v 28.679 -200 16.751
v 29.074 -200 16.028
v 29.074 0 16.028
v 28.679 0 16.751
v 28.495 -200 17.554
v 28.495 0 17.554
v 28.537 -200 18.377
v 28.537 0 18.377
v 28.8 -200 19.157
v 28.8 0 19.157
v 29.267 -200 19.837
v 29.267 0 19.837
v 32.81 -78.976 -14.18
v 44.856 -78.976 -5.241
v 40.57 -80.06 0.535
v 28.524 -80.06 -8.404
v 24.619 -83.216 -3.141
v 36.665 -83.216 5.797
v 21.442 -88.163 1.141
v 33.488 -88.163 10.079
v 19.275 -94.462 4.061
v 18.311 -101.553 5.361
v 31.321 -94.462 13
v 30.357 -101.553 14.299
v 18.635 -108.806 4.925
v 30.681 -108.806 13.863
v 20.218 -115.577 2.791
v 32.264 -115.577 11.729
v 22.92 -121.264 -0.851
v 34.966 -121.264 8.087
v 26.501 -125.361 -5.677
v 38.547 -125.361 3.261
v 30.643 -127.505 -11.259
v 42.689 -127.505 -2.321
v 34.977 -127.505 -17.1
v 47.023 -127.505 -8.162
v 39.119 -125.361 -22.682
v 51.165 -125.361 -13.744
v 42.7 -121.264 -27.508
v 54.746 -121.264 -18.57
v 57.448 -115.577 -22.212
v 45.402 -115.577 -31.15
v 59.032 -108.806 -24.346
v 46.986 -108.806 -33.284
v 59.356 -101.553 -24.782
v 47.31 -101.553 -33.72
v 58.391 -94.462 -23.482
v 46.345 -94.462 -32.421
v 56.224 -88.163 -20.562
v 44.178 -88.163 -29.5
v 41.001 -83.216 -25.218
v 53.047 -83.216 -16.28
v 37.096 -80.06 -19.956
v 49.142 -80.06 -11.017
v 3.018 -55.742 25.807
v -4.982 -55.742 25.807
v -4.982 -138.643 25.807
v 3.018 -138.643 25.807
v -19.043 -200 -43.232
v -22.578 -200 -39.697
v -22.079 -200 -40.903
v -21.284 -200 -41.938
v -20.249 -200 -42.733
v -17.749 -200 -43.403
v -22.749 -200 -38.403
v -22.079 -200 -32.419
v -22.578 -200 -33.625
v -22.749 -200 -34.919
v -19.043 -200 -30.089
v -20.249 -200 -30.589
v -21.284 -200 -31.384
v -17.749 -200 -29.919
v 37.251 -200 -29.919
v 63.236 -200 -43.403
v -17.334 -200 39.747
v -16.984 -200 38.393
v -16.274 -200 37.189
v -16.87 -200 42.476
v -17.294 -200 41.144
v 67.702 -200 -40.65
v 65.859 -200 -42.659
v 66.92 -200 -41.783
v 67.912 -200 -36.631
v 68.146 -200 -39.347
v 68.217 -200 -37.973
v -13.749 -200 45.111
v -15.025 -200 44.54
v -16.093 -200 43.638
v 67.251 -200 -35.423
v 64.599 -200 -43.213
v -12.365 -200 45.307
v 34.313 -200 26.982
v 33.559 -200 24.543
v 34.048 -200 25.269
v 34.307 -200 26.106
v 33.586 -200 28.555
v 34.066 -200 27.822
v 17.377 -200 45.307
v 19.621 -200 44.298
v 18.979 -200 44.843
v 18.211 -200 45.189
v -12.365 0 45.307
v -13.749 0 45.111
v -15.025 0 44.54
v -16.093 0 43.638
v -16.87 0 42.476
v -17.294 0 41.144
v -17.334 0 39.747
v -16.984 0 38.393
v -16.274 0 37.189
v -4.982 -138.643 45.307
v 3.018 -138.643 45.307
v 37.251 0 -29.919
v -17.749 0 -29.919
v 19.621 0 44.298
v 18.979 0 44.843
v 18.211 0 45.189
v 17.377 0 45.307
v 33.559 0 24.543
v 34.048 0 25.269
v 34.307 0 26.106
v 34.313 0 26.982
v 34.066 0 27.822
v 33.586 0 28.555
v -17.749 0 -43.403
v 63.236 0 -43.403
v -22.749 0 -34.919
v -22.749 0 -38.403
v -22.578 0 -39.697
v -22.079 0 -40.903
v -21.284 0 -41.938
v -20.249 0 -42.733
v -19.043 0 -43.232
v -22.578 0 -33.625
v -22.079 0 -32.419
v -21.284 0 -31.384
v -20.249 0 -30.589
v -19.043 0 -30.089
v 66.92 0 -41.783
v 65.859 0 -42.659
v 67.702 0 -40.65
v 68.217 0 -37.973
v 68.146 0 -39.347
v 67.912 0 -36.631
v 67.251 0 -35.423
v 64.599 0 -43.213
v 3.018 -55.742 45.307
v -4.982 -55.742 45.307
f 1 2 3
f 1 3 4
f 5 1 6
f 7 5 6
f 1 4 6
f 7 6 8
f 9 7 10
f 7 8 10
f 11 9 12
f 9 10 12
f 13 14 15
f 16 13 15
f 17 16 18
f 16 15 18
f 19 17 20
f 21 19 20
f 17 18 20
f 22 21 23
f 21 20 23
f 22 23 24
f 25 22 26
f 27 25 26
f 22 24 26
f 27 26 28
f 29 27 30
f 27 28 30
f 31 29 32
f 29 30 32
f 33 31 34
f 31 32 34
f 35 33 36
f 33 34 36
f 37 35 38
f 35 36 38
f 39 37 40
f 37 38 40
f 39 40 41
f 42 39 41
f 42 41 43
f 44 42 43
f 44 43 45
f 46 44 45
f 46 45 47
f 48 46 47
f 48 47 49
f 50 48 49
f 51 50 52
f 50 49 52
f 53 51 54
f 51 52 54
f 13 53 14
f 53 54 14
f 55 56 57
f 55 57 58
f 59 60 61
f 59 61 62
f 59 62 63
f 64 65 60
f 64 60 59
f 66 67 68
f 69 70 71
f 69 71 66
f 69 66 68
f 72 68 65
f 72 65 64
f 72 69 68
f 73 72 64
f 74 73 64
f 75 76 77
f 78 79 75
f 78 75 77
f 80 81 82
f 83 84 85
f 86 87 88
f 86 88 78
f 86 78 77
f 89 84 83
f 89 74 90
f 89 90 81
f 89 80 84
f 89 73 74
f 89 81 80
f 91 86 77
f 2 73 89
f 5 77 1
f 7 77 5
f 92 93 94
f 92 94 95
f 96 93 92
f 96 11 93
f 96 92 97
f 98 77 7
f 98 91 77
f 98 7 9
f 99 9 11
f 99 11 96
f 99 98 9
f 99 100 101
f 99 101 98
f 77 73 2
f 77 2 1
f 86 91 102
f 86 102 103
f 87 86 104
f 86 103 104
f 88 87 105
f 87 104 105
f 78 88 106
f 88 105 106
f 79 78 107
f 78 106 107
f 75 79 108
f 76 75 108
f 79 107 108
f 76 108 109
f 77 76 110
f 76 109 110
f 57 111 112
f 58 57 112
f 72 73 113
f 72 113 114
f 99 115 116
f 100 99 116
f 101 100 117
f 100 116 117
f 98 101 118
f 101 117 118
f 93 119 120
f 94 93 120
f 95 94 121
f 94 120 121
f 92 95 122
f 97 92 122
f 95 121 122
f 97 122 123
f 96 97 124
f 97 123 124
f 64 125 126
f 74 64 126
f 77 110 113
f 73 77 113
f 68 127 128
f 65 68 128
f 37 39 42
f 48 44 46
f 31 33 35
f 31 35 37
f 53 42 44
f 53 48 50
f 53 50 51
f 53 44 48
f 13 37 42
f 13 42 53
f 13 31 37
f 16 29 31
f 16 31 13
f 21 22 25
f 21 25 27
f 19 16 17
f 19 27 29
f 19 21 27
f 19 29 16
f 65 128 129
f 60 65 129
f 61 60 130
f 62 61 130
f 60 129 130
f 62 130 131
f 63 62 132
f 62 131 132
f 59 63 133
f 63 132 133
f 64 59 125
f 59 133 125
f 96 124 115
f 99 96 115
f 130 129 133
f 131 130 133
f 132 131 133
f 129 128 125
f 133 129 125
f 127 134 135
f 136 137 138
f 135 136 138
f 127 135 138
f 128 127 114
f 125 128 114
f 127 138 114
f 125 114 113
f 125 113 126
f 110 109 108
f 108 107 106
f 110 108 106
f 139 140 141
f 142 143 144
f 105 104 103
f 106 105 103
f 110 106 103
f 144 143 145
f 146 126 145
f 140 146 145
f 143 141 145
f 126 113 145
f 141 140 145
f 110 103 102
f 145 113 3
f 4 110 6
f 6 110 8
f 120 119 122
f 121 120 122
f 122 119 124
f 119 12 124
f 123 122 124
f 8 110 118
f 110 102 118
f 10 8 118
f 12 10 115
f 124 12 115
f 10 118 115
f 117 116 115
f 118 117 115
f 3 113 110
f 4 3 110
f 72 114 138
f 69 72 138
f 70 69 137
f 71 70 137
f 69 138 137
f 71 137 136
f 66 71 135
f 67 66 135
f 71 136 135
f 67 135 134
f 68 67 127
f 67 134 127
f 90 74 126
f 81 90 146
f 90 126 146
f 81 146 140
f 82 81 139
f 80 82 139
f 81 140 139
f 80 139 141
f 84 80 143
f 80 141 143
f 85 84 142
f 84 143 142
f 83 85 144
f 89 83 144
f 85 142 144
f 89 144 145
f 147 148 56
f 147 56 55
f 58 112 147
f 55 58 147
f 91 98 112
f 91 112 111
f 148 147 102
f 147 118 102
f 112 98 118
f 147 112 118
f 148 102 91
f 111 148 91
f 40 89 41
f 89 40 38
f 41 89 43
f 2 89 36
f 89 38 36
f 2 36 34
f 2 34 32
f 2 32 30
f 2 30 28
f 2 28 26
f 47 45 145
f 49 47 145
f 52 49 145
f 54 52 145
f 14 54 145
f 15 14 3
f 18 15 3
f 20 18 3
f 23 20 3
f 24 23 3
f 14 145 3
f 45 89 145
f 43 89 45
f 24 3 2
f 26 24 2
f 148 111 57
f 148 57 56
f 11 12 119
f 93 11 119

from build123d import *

# Parameters (mm, degrees)
F1_DEPTH = 200
F2_W     = 8
F2_H     = 82.9011678715
F3_DEPTH = 19.5
F4_R     = 24.4008451418
F5_DEPTH = 15


with BuildPart() as f1:
    # F0 (on Front) → F1 (new body)
    with BuildSketch(Plane.XZ):
        with BuildLine():
            Line((0, 45.3068651259), (-12.3650406395, 45.3068651259))
            ThreePointArc((-12.3650406395, 45.3068651259), (-16.8699670467, 42.4761133979), (-16.2739621693, 37.1891203522))
            Line((-16.2739621693, 37.1891203522), (37.2513475231, -29.9190782446))
            Line((37.2513475231, -29.9190782446), (-17.7486524769, -29.9190782446))
            ThreePointArc((-17.7486524769, -29.9190782446), (-21.2841863828, -31.3835443387), (-22.7486524769, -34.9190782446))
            Line((-22.7486524769, -34.9190782446), (-22.7486524769, -38.4026915))
            ThreePointArc((-22.7486524769, -38.4026915), (-21.2841863828, -41.9382254059), (-17.7486524769, -43.4026915))
            Line((-17.7486524769, -43.4026915), (63.2359994792, -43.4026915))
            ThreePointArc((63.2359994792, -43.4026915), (67.7023811618, -40.6502311917), (67.2513475231, -35.4232653662))
            Line((67.2513475231, -35.4232653662), (29.0742767855, 16.0276582094))
            ThreePointArc((29.0742767855, 16.0276582094), (28.4873114519, 17.9667747875), (29.2668350391, 19.8368133922))
            Line((29.2668350391, 19.8368133922), (33.5585934884, 24.5428886656))
            ThreePointArc((33.5585934884, 24.5428886656), (34.3418720133, 26.5437627089), (33.5861795165, 28.5552176636))
            Line((33.5861795165, 28.5552176636), (19.6212582392, 44.2976946213))
            ThreePointArc((19.6212582392, 44.2976946213), (18.6073694579, 45.0429653147), (17.3770216384, 45.3068651259))
            Line((17.3770216384, 45.3068651259), (0, 45.3068651259))
        make_face()
    extrude(amount=F1_DEPTH)

    # F2 (on face) → F3 (cut)
    with BuildSketch(Plane.XY.offset(45.3068651259)):
        with Locations((-0.9822997963, -97.1923060715)):
            Rectangle(F2_W, F2_H)
    extrude(amount=-F3_DEPTH, mode=Mode.SUBTRACT)

    # F4 (on face) → F5 (cut)
    with BuildSketch(Plane(origin=(26.4204382833, 0, 19.6042144857), x_dir=(0, 1, 0), z_dir=(0.8030696088, 0, 0.5958852268))):
        with Locations((-103.3766940236, -30.9382844716)):
            Circle(F4_R)
    extrude(amount=-F5_DEPTH, mode=Mode.SUBTRACT)


solid = f1.part
